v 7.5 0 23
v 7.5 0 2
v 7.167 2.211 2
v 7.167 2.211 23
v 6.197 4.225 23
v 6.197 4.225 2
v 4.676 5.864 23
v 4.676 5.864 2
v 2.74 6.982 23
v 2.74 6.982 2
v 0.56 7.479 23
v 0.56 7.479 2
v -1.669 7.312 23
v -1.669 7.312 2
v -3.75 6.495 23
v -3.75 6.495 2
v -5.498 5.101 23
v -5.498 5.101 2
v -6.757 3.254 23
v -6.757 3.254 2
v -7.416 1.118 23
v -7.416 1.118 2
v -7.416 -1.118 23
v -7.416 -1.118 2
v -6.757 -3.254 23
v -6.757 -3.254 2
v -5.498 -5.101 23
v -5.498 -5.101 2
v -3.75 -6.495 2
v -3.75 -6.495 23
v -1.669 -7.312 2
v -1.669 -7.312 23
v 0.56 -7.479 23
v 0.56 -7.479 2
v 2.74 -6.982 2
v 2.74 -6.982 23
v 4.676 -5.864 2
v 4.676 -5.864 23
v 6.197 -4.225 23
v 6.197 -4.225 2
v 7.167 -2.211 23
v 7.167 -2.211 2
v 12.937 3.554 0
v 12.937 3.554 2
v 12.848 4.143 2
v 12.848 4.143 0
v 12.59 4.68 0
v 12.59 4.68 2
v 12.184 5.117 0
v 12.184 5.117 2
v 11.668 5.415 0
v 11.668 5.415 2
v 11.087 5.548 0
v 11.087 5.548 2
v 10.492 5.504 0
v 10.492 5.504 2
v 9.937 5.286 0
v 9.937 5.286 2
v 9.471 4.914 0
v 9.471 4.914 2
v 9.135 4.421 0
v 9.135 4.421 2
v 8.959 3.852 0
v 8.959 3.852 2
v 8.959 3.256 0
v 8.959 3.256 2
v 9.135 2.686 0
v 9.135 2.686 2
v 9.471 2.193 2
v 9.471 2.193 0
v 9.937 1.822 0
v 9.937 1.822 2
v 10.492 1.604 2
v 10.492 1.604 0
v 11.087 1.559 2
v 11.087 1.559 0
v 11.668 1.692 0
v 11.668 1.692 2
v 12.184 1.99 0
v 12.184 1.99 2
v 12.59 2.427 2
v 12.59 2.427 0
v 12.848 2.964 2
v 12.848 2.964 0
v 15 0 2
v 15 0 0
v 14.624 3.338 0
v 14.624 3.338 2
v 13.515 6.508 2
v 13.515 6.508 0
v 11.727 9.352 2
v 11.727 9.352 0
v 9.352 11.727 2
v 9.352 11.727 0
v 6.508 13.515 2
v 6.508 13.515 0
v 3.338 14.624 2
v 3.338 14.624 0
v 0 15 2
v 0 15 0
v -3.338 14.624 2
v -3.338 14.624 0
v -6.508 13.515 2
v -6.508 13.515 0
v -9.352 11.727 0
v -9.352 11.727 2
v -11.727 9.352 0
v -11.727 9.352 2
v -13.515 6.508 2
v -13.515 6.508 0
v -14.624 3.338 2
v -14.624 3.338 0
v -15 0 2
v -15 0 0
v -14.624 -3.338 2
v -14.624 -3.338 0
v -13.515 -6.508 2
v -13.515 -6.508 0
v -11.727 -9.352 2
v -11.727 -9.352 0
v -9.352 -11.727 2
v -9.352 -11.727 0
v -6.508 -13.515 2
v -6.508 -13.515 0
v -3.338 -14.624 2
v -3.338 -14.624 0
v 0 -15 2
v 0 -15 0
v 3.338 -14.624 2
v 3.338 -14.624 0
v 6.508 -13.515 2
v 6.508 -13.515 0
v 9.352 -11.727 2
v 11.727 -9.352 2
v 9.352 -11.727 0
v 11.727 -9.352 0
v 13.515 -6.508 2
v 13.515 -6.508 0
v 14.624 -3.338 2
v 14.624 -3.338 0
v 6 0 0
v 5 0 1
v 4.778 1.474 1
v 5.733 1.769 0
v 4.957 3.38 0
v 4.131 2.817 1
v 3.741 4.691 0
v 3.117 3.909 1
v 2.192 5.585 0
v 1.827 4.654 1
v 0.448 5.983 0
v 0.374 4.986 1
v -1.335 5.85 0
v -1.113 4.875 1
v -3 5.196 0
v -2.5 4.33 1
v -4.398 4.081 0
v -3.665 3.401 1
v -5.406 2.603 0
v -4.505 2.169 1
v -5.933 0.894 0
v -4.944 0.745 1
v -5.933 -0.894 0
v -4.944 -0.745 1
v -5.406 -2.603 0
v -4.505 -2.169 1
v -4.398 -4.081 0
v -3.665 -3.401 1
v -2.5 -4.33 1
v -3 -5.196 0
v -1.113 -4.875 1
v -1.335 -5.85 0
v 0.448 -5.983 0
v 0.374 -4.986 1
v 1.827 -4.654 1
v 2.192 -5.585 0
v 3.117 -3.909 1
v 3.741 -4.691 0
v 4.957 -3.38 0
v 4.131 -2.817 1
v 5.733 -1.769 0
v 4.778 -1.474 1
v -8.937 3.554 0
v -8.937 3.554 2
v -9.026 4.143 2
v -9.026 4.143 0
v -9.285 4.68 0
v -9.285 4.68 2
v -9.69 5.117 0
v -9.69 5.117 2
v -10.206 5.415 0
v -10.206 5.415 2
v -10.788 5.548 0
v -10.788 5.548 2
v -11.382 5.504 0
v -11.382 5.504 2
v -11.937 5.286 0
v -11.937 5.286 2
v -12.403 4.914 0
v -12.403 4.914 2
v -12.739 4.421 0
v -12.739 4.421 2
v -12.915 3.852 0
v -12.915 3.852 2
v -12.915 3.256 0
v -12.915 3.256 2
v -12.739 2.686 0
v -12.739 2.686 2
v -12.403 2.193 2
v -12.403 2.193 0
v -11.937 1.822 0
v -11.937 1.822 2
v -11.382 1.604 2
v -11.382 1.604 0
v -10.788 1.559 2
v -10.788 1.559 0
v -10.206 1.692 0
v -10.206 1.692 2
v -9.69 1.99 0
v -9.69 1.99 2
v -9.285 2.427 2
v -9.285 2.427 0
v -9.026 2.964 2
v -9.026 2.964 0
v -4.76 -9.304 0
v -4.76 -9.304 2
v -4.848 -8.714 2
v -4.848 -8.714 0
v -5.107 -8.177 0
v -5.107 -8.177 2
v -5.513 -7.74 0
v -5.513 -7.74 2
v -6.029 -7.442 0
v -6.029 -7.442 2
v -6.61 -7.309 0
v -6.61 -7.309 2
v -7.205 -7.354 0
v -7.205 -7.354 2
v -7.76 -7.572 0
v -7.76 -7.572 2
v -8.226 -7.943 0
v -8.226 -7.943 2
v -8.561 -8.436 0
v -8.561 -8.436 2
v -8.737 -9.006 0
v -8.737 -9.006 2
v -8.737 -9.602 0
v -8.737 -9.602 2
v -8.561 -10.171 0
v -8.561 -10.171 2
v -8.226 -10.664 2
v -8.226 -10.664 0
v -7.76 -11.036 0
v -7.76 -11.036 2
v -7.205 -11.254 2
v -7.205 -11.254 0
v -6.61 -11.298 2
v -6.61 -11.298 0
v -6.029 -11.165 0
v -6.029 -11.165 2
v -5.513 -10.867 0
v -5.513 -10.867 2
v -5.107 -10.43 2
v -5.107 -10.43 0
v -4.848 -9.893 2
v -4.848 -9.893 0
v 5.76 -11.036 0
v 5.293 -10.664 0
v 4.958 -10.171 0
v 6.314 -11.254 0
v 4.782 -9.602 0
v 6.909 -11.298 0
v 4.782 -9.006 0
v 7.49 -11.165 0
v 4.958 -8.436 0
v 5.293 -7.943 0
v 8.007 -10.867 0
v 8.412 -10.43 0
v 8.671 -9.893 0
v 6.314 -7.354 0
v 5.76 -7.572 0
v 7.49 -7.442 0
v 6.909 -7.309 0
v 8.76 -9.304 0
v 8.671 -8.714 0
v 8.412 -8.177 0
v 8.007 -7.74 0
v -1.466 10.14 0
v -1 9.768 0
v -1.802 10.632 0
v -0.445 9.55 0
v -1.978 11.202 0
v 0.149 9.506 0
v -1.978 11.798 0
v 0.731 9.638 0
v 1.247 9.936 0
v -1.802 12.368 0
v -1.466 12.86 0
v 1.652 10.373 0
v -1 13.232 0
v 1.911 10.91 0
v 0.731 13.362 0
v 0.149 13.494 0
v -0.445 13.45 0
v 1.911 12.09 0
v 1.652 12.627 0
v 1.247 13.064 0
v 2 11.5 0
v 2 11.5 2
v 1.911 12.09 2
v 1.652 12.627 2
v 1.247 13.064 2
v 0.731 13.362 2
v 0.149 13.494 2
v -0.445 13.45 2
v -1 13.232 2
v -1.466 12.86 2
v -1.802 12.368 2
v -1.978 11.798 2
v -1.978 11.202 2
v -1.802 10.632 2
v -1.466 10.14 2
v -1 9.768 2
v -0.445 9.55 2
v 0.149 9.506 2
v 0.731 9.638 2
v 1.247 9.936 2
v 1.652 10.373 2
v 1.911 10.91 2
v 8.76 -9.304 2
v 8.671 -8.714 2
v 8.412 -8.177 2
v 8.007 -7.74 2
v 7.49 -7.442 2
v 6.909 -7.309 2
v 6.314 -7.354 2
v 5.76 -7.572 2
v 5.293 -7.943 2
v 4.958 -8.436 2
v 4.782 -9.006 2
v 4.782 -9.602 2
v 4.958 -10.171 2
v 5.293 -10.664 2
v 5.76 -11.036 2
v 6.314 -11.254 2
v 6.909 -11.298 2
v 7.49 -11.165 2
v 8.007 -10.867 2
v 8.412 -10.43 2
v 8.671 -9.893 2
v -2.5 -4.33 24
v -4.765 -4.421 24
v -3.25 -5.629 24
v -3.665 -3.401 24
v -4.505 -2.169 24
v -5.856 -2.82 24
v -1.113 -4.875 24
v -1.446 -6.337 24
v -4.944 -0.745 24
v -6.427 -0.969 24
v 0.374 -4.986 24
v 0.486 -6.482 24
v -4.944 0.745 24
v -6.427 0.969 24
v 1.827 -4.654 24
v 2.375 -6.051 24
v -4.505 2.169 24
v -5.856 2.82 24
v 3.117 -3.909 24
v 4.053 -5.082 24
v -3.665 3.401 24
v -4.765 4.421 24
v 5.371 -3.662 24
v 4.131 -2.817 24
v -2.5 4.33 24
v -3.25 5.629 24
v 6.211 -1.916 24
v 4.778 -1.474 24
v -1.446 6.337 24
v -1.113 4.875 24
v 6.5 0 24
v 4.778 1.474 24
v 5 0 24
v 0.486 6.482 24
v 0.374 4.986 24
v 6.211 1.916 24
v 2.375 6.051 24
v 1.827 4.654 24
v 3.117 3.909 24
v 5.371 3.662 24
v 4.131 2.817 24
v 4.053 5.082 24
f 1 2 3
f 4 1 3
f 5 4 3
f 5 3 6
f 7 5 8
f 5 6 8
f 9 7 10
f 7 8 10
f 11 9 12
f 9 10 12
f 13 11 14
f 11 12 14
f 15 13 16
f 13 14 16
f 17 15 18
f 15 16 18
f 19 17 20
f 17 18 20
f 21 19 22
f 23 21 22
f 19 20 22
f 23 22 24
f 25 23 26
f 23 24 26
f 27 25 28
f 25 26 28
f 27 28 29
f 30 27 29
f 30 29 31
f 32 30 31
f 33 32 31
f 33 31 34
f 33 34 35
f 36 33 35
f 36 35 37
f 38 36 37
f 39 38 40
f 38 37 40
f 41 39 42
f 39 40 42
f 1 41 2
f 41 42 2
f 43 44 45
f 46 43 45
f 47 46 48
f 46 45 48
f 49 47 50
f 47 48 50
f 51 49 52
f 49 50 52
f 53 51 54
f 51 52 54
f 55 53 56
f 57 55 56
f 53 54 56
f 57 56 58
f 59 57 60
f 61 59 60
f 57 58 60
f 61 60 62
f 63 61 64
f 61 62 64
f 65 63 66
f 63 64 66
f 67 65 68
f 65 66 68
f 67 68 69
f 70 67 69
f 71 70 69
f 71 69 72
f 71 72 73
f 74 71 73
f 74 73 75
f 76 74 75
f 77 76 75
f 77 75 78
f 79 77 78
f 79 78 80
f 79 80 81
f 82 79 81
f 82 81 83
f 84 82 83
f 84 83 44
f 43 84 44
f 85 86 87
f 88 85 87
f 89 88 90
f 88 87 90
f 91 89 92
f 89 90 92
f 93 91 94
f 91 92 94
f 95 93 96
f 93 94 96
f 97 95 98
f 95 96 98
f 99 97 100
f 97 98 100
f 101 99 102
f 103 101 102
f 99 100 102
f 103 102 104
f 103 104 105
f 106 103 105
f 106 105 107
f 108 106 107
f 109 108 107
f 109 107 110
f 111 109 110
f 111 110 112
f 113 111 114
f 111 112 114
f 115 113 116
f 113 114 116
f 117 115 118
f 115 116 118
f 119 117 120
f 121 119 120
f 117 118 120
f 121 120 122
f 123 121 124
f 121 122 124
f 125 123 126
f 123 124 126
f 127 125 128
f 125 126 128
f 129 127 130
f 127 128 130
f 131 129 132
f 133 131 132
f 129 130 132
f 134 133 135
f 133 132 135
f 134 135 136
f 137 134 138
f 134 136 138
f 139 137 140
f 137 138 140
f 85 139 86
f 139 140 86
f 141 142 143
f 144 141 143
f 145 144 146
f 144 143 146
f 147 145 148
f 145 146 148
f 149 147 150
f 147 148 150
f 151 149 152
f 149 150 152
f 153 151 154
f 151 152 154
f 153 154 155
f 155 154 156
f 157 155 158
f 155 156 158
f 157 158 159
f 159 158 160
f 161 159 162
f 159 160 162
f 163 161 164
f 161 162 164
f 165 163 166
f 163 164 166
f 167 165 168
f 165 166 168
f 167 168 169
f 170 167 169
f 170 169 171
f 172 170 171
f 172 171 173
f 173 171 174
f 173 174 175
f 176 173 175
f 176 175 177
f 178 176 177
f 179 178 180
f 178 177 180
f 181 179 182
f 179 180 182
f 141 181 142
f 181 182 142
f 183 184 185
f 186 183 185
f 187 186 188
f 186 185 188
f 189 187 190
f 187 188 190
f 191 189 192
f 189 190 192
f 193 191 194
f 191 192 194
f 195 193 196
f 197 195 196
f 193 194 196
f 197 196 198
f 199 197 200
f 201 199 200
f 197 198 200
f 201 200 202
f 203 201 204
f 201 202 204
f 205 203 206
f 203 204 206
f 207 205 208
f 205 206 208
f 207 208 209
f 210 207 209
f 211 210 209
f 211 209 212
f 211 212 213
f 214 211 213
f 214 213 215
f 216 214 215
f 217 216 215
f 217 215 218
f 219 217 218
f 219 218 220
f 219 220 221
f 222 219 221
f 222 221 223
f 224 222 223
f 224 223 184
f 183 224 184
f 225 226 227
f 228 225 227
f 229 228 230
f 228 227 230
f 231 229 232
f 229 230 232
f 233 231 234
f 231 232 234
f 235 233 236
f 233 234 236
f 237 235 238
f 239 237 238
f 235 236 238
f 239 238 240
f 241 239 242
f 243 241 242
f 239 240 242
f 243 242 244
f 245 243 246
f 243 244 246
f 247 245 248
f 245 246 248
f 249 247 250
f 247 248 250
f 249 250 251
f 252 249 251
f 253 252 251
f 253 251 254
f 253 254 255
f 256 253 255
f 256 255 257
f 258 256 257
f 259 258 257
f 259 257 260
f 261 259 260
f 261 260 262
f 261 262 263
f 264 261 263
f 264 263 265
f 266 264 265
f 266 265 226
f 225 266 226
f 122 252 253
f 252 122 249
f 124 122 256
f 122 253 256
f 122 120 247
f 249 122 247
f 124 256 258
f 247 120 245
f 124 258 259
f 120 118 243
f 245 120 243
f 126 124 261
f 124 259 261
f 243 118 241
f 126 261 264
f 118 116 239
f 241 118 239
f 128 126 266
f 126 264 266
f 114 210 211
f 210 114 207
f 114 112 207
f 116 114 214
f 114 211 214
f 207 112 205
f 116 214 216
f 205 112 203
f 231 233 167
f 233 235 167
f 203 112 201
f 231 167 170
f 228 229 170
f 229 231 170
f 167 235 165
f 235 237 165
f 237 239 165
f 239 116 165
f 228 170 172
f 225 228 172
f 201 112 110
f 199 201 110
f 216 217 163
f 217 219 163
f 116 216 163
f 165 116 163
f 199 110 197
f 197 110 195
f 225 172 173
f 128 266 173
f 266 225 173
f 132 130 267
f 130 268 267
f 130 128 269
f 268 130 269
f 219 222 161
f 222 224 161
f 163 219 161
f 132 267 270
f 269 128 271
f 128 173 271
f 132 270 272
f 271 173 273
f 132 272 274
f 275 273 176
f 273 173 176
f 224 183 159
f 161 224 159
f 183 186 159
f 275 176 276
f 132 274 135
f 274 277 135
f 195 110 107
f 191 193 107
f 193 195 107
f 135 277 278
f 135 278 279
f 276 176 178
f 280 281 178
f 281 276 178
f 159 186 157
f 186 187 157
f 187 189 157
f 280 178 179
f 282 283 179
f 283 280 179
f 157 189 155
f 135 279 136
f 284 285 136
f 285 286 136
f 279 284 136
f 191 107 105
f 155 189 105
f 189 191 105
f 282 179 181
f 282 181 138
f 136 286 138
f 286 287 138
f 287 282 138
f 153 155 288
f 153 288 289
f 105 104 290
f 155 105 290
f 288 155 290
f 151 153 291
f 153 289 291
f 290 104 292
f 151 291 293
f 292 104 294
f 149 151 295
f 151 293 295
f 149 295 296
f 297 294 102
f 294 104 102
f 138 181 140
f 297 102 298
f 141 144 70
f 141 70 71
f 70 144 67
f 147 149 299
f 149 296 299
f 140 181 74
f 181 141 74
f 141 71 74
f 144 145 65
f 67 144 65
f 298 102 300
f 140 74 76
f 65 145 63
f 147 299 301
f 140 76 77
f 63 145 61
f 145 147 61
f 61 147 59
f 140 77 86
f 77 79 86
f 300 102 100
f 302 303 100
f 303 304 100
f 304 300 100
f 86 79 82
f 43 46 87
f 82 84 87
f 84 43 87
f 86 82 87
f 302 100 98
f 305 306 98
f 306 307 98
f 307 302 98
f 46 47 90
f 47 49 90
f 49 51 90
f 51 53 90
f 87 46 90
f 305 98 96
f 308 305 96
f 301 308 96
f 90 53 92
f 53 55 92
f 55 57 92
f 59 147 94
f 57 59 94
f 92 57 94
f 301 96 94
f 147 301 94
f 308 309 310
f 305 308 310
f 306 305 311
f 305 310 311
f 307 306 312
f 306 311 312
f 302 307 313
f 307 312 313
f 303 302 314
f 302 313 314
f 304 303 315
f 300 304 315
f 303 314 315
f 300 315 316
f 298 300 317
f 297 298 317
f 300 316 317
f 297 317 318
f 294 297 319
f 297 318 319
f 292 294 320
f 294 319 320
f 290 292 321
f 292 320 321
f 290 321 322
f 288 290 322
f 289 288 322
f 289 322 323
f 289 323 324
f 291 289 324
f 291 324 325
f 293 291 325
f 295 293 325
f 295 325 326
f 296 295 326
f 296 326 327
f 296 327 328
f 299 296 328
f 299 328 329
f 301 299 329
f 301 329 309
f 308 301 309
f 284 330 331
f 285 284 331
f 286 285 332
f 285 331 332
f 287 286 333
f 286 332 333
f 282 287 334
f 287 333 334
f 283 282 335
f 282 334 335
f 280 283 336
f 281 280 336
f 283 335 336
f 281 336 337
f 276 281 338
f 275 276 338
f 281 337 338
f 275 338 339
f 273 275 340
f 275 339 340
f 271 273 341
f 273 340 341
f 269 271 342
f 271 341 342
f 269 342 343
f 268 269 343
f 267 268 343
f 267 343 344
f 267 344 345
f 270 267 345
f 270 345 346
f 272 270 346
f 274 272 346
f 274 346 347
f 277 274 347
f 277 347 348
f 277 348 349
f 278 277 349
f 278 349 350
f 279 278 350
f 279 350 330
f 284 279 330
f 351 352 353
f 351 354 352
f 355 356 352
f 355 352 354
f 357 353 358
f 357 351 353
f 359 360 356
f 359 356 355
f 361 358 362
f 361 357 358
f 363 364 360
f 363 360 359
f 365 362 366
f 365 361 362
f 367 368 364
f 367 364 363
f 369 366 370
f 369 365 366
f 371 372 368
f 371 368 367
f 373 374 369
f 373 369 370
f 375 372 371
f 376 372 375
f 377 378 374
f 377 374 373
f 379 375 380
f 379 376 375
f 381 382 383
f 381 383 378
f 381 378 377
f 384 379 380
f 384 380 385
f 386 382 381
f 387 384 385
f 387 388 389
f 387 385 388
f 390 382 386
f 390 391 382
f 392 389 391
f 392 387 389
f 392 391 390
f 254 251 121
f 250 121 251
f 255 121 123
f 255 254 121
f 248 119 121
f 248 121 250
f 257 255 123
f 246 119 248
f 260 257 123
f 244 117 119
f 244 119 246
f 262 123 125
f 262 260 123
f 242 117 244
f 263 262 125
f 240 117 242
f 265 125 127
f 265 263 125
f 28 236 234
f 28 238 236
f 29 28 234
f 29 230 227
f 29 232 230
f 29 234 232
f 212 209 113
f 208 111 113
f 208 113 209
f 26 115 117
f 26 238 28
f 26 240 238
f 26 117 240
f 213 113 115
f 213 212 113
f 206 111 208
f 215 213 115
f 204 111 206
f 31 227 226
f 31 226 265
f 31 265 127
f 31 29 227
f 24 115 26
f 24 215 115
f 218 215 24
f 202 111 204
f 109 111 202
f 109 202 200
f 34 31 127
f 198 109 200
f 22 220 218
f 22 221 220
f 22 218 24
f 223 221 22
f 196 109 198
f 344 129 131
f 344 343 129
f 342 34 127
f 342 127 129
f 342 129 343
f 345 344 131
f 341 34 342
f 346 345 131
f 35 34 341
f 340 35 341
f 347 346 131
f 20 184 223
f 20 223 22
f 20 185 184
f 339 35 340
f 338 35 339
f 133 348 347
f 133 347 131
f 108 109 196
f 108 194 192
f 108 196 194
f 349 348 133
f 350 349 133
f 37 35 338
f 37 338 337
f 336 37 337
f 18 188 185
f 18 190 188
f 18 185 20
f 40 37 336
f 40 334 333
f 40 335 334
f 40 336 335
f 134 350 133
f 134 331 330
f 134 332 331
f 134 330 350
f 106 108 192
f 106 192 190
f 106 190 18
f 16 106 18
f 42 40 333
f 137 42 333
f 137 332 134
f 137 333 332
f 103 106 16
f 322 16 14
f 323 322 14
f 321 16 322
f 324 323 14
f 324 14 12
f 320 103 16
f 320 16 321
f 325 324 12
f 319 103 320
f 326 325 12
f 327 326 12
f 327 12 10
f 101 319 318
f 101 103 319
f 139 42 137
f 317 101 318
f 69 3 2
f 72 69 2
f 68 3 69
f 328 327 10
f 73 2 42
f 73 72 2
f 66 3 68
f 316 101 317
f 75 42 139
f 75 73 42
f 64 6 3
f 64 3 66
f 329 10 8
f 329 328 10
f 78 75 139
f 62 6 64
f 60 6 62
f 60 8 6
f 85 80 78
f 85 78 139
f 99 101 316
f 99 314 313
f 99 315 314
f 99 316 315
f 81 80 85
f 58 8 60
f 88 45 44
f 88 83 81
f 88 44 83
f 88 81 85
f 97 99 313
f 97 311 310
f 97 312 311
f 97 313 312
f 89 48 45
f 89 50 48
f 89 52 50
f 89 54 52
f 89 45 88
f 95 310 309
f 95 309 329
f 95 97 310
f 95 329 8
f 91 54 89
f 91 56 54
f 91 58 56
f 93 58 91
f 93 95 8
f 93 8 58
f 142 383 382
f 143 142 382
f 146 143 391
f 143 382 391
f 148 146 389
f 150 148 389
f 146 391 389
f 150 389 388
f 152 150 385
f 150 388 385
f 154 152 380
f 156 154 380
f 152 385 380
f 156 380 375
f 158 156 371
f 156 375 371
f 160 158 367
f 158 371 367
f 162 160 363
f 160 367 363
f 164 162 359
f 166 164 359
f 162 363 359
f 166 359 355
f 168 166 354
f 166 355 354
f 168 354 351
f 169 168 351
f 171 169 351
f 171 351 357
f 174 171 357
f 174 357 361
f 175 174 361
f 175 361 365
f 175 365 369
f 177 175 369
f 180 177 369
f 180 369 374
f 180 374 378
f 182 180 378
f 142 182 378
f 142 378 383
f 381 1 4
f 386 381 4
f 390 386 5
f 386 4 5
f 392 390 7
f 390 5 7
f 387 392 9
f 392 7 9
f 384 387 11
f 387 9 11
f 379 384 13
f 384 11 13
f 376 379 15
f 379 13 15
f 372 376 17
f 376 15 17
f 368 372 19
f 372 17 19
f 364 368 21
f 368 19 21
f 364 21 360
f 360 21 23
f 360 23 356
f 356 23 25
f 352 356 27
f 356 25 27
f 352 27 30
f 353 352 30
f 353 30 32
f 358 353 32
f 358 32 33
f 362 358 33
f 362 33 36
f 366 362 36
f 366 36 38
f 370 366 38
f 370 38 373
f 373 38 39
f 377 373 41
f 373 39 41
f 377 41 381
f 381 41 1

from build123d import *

# Parameters (mm, degrees)
SKETCH1_R           = 15
BOSS_EXTRUDE1_DEPTH = 2
SKETCH2_R           = 7.5
BOSS_EXTRUDE2_DEPTH = 22
SKETCH3_R           = 5
CUT_EXTRUDE1_DEPTH  = 25
SKETCH4_R           = 2
CUT_EXTRUDE2_DEPTH  = 3
CHAMFER1_SIZE       = 1
CHAMFER2_SIZE       = 1


with BuildPart() as part:
    # Sketch1 → Boss-Extrude1 (new body)
    with BuildSketch(Plane.XY):
        Circle(SKETCH1_R)
    extrude(amount=BOSS_EXTRUDE1_DEPTH)

    # Sketch2 → Boss-Extrude2 (add)
    with BuildSketch(Plane.XY.offset(2)):
        Circle(SKETCH2_R)
    extrude(amount=BOSS_EXTRUDE2_DEPTH)

    # Sketch3 → Cut-Extrude1 (cut, through all)
    with BuildSketch(Plane.XY.offset(24)):
        Circle(SKETCH3_R)
    extrude(amount=-CUT_EXTRUDE1_DEPTH, mode=Mode.SUBTRACT)

    # Sketch4 → Cut-Extrude2 (cut, through all)
    with BuildSketch(Plane.XY.offset(2)):
        with Locations((0, 11.5)):
            Circle(SKETCH4_R)
        with Locations((10.937149937, 3.553695435)):
            Circle(SKETCH4_R)
        with Locations((6.759530401, -9.303695435)):
            Circle(SKETCH4_R)
        with Locations((-6.759530401, -9.303695435)):
            Circle(SKETCH4_R)
        with Locations((-10.937149937, 3.553695435)):
            Circle(SKETCH4_R)
    extrude(amount=-CUT_EXTRUDE2_DEPTH, mode=Mode.SUBTRACT)

    # Chamfer1
    chamfer1_edges = [part.edges().sort_by_distance(p)[0] for p in [
        (-5, 0, 0),
    ]]
    chamfer(chamfer1_edges, length=CHAMFER1_SIZE)

    # Chamfer2
    chamfer2_edges = [part.edges().sort_by_distance(p)[0] for p in [
        (-7.5, 0, 24),
    ]]
    chamfer(chamfer2_edges, length=CHAMFER2_SIZE)


solid = part.part
